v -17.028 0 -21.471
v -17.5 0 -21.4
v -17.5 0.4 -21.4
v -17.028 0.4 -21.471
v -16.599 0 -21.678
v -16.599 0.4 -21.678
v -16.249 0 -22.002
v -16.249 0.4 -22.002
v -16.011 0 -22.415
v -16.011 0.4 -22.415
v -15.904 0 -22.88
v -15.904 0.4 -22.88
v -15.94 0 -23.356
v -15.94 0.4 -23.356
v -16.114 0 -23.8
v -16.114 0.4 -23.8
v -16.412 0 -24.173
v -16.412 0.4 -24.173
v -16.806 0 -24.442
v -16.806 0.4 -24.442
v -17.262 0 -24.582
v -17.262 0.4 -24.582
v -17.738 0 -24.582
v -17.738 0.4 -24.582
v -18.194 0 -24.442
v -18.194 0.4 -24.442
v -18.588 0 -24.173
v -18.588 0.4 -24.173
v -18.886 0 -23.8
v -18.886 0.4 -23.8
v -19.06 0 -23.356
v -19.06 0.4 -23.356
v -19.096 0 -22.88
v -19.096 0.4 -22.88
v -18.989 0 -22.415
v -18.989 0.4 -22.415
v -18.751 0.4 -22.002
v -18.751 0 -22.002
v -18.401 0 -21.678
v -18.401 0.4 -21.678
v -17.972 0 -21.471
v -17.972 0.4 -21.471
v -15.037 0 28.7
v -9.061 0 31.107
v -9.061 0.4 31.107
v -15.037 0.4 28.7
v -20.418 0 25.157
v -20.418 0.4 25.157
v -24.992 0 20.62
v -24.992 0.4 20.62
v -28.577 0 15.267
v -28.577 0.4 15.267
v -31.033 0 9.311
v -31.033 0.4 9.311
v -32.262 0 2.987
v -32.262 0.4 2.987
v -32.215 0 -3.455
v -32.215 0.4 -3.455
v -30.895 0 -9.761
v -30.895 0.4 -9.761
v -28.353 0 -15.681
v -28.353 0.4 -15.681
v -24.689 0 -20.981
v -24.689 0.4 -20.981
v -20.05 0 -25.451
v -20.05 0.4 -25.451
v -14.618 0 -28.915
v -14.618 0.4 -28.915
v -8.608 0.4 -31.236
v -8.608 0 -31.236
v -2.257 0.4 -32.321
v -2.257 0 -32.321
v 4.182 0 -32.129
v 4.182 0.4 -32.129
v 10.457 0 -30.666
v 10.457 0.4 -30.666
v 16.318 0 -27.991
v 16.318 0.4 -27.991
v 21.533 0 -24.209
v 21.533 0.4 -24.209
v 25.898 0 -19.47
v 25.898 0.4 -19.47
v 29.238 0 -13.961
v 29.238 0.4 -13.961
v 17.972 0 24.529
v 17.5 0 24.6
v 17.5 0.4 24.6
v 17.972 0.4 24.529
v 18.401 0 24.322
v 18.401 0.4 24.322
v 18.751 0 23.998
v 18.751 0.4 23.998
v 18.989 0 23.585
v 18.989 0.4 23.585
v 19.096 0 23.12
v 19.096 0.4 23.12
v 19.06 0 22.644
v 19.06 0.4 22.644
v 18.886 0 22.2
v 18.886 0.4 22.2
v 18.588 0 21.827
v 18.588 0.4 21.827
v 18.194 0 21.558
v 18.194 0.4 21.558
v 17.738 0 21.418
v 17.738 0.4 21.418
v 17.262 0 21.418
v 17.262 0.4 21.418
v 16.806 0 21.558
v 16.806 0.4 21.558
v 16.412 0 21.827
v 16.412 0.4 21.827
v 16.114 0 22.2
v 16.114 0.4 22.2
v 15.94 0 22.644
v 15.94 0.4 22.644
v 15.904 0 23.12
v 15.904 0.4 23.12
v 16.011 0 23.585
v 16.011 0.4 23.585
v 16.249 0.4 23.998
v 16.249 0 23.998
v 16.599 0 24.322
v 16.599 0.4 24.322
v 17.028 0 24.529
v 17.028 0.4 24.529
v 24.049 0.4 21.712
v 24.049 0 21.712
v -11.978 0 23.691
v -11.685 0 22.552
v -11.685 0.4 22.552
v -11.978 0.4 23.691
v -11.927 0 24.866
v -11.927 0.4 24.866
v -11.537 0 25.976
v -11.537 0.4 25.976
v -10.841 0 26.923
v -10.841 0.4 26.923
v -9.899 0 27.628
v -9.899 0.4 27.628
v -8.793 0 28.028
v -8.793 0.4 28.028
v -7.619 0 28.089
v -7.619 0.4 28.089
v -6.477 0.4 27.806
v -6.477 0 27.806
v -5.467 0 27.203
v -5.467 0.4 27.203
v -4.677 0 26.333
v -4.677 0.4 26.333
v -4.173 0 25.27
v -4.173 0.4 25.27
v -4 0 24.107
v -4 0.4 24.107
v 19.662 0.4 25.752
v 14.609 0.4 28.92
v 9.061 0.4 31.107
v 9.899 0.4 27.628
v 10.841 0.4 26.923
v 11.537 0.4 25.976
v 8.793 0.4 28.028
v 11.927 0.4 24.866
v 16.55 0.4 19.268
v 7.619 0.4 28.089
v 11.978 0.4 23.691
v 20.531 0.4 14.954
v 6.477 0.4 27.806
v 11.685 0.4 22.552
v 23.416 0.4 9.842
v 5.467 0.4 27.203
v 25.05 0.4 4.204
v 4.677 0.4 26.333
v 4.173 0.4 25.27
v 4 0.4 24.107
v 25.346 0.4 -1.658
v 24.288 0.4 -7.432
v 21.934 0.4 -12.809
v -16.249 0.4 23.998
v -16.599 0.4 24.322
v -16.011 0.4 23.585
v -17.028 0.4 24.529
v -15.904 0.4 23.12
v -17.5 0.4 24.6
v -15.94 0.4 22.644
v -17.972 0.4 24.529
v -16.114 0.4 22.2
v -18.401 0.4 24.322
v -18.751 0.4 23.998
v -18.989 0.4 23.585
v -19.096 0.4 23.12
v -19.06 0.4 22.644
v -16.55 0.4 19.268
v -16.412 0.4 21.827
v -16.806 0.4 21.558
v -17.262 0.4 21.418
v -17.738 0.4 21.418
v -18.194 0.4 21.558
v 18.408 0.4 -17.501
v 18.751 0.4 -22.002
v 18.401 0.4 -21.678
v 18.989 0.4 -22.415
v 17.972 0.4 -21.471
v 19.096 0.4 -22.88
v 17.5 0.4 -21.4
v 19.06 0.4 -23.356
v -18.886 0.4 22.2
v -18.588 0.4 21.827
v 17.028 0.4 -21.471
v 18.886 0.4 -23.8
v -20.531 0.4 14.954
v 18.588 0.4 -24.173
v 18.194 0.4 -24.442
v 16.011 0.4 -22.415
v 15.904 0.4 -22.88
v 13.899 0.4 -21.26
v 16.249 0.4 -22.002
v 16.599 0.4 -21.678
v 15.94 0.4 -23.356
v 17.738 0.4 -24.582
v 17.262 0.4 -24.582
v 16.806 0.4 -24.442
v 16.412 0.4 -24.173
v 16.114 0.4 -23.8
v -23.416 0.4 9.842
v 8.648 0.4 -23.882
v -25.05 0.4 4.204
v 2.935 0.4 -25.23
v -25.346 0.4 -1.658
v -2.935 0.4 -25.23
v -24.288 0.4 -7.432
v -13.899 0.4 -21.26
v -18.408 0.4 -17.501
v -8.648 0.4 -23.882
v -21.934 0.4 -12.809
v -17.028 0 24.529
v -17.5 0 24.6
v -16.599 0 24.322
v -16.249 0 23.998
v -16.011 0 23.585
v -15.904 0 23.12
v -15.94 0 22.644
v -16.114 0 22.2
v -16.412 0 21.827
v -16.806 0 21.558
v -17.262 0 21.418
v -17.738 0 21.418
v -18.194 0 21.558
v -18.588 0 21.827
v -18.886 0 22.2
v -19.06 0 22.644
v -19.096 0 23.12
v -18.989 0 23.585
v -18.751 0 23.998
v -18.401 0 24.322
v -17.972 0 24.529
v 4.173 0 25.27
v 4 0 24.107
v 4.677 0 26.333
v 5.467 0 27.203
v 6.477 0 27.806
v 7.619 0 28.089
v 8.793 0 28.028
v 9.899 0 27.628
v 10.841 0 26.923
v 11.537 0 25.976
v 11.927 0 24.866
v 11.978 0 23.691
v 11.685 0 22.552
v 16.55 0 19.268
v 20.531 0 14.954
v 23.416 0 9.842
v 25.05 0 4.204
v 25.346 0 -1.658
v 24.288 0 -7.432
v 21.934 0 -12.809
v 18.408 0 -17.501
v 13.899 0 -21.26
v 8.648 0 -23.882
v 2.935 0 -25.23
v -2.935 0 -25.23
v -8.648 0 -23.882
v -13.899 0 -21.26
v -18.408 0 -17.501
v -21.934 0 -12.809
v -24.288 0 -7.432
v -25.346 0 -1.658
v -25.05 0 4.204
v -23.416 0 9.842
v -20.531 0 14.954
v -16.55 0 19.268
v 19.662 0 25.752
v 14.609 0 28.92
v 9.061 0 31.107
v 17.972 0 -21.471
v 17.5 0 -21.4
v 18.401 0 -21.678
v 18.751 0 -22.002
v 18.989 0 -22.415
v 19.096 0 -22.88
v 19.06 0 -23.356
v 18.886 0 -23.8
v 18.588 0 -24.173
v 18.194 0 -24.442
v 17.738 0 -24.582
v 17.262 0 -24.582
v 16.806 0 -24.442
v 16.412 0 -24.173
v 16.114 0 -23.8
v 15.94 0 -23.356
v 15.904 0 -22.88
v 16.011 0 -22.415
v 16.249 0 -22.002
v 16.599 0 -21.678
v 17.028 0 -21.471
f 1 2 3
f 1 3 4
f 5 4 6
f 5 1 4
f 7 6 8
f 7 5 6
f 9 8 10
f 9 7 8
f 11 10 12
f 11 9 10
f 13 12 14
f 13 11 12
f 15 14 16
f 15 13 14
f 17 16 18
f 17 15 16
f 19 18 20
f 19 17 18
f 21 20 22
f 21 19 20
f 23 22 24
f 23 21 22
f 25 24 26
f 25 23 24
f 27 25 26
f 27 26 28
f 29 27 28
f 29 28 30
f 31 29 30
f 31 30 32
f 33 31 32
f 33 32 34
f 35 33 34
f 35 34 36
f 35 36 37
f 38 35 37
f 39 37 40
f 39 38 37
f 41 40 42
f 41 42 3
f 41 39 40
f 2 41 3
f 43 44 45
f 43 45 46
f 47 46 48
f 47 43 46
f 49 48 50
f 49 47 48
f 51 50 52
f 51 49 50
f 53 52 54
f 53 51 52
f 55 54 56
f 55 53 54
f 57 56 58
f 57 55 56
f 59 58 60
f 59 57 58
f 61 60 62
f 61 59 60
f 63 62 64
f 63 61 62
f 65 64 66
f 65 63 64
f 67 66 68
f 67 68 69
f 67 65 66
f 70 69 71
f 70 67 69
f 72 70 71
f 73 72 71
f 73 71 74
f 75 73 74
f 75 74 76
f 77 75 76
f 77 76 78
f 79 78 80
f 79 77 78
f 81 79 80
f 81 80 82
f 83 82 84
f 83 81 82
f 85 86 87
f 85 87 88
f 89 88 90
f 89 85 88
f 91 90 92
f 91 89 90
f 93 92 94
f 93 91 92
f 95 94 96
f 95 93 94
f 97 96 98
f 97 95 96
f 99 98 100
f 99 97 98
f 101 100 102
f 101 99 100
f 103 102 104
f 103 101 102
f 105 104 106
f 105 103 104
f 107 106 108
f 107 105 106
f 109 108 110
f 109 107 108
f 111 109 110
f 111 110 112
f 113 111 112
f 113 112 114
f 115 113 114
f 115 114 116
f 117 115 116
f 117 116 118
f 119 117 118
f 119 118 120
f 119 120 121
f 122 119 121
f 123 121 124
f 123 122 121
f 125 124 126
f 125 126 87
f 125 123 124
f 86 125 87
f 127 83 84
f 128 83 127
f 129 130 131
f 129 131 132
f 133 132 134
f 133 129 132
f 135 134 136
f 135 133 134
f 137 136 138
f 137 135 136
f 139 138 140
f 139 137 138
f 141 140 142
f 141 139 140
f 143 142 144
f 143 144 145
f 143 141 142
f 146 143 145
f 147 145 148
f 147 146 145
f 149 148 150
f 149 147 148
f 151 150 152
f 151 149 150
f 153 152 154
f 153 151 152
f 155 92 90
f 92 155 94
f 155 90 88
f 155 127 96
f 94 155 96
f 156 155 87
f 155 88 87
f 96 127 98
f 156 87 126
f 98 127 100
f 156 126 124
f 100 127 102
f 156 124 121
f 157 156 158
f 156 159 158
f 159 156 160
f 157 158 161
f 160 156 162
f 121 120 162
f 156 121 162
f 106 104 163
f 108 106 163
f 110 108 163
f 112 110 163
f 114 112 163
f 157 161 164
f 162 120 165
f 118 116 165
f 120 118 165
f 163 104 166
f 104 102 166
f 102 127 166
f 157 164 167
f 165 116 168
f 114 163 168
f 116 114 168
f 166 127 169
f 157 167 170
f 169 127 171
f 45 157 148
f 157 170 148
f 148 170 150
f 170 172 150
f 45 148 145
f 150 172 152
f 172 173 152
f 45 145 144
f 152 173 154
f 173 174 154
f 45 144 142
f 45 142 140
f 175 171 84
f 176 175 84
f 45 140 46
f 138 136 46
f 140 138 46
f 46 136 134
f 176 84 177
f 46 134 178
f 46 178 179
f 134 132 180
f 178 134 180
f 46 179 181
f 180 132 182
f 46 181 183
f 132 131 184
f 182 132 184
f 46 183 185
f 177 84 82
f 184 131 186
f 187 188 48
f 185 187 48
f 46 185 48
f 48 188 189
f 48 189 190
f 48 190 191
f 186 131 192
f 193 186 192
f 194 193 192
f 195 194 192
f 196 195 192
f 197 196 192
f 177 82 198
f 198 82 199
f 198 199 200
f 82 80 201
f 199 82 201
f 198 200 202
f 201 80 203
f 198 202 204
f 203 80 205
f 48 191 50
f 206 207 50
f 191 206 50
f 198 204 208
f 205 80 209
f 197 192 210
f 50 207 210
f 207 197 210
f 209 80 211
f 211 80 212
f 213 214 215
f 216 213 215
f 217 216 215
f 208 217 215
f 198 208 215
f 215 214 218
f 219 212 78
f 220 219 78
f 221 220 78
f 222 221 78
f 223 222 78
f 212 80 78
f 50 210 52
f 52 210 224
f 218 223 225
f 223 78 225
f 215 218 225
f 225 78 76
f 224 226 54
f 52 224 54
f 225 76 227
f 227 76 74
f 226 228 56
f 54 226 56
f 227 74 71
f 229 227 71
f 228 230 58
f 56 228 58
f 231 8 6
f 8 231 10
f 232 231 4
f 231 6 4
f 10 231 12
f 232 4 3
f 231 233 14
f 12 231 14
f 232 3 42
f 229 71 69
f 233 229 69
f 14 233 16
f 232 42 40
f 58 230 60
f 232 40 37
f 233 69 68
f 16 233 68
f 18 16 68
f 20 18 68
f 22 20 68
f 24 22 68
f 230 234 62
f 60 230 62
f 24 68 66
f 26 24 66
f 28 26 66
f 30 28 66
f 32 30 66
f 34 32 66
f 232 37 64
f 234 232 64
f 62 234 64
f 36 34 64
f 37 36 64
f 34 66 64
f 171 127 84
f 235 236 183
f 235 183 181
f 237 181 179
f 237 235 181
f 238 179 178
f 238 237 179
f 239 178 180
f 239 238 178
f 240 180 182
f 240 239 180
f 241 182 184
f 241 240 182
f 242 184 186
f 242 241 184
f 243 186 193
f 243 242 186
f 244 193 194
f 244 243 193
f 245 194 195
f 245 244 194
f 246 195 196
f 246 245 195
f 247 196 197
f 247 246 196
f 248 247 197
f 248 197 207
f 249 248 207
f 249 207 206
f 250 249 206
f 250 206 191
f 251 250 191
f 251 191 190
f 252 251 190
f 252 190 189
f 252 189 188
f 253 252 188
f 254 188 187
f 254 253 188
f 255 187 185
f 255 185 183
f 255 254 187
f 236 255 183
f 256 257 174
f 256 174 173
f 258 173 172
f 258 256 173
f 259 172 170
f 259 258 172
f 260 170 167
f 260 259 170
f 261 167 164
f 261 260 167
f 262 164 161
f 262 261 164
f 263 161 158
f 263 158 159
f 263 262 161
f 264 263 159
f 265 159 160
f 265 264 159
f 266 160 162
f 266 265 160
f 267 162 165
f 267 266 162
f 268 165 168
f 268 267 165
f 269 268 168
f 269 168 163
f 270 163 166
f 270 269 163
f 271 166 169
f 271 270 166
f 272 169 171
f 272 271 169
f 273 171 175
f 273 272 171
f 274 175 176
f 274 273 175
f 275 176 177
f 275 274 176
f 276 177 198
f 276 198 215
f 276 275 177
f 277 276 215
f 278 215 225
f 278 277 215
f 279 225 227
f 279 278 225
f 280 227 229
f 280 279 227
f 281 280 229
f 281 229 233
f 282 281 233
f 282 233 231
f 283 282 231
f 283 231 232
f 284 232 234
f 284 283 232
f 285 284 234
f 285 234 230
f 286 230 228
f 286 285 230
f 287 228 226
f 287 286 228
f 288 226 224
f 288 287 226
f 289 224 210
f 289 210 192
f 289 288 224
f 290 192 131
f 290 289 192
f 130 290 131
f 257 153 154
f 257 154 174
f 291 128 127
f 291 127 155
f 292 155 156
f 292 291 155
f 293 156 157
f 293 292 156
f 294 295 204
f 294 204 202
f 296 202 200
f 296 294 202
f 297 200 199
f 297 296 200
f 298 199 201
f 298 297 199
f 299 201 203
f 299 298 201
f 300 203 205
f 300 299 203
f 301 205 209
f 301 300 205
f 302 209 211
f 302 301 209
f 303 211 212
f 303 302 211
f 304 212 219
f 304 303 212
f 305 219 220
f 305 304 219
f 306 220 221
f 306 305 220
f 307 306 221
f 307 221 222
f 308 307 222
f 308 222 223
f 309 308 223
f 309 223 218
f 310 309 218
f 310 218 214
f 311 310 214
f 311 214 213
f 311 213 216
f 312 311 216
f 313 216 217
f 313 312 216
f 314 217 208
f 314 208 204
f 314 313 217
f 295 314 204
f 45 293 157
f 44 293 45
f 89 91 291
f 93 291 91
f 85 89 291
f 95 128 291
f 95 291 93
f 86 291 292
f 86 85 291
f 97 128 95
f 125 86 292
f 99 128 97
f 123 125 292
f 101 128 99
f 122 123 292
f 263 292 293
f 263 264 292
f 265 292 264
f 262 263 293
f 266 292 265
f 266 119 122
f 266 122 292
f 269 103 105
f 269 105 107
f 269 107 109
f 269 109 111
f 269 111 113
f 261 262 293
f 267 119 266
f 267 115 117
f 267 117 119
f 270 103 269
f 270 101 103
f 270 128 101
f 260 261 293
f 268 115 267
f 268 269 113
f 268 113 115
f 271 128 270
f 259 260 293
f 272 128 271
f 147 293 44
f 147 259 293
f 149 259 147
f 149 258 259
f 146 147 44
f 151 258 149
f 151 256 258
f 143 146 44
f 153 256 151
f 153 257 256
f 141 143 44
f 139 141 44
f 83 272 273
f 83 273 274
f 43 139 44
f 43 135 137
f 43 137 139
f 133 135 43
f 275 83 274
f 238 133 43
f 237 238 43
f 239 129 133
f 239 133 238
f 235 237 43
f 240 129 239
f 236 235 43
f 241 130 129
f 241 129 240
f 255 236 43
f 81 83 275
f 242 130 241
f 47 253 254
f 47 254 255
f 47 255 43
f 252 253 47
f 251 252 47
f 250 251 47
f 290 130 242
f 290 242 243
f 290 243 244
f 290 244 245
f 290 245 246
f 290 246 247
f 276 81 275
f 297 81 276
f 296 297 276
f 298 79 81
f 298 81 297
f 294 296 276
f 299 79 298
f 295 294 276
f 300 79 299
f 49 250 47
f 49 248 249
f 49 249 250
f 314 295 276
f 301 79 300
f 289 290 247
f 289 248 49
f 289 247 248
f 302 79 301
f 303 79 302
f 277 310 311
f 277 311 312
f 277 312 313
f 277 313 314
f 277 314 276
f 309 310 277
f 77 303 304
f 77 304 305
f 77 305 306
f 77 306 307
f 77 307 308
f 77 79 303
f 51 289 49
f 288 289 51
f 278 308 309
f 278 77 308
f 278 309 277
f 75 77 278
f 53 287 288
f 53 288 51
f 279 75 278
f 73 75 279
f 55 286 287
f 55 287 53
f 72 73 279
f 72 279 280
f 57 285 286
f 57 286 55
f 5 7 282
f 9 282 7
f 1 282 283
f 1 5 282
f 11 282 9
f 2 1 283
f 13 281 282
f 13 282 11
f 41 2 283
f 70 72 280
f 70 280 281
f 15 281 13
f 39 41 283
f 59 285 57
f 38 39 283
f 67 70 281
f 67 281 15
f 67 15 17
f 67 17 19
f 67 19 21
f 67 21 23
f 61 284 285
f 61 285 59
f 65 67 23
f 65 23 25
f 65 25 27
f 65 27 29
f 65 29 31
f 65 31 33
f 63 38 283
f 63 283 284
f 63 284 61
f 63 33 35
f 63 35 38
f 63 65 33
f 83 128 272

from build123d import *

# Parameters (mm, degrees)
SKETCH1_R           = 1.6
BOSS_EXTRUDE1_DEPTH = 0.4


with BuildPart() as part:
    # Sketch1 → Boss-Extrude1 (new body)
    with BuildSketch(Plane(origin=(0, 0, 0), x_dir=(1, 0, 0), z_dir=(0, 1, 0))):
        with BuildLine():
            Line((29.237843605, 13.960963482), (24.049079653, -21.711788683))
            ThreePointArc((24.049079653, -21.711788683), (17.208573183, -27.452231403), (9.060814288, -31.107260317))
            Line((9.060814288, -31.107260317), (-9.060814288, -31.107260317))
            ThreePointArc((-9.060814288, -31.107260317), (-24.689356555, 20.980840614), (29.237843605, 13.960963482))
        make_face()
        with Locations(Location((-17.5, 23, 0), (0, 0, 270))):
            Circle(SKETCH1_R, mode=Mode.SUBTRACT)
        with Locations(Location((-17.5, -23, 0), (0, 0, 270))):
            Circle(SKETCH1_R, mode=Mode.SUBTRACT)
        with Locations(Location((17.5, -23, 0), (0, 0, 270))):
            Circle(SKETCH1_R, mode=Mode.SUBTRACT)
        with Locations(Location((17.5, 23, 0), (0, 0, 270))):
            Circle(SKETCH1_R, mode=Mode.SUBTRACT)
        with BuildLine():
            Line((-4, -24.107260317), (4, -24.107260317))
            ThreePointArc((4, -24.107260317), (8.793181532, -28.027829543), (11.685431528, -22.552398764))
            ThreePointArc((11.685431528, -22.552398764), (0, 25.4), (-11.685431528, -22.552398764))
            ThreePointArc((-11.685431528, -22.552398764), (-8.793181532, -28.027829543), (-4, -24.107260317))
        make_face(mode=Mode.SUBTRACT)
    extrude(amount=BOSS_EXTRUDE1_DEPTH)


solid = part.part
